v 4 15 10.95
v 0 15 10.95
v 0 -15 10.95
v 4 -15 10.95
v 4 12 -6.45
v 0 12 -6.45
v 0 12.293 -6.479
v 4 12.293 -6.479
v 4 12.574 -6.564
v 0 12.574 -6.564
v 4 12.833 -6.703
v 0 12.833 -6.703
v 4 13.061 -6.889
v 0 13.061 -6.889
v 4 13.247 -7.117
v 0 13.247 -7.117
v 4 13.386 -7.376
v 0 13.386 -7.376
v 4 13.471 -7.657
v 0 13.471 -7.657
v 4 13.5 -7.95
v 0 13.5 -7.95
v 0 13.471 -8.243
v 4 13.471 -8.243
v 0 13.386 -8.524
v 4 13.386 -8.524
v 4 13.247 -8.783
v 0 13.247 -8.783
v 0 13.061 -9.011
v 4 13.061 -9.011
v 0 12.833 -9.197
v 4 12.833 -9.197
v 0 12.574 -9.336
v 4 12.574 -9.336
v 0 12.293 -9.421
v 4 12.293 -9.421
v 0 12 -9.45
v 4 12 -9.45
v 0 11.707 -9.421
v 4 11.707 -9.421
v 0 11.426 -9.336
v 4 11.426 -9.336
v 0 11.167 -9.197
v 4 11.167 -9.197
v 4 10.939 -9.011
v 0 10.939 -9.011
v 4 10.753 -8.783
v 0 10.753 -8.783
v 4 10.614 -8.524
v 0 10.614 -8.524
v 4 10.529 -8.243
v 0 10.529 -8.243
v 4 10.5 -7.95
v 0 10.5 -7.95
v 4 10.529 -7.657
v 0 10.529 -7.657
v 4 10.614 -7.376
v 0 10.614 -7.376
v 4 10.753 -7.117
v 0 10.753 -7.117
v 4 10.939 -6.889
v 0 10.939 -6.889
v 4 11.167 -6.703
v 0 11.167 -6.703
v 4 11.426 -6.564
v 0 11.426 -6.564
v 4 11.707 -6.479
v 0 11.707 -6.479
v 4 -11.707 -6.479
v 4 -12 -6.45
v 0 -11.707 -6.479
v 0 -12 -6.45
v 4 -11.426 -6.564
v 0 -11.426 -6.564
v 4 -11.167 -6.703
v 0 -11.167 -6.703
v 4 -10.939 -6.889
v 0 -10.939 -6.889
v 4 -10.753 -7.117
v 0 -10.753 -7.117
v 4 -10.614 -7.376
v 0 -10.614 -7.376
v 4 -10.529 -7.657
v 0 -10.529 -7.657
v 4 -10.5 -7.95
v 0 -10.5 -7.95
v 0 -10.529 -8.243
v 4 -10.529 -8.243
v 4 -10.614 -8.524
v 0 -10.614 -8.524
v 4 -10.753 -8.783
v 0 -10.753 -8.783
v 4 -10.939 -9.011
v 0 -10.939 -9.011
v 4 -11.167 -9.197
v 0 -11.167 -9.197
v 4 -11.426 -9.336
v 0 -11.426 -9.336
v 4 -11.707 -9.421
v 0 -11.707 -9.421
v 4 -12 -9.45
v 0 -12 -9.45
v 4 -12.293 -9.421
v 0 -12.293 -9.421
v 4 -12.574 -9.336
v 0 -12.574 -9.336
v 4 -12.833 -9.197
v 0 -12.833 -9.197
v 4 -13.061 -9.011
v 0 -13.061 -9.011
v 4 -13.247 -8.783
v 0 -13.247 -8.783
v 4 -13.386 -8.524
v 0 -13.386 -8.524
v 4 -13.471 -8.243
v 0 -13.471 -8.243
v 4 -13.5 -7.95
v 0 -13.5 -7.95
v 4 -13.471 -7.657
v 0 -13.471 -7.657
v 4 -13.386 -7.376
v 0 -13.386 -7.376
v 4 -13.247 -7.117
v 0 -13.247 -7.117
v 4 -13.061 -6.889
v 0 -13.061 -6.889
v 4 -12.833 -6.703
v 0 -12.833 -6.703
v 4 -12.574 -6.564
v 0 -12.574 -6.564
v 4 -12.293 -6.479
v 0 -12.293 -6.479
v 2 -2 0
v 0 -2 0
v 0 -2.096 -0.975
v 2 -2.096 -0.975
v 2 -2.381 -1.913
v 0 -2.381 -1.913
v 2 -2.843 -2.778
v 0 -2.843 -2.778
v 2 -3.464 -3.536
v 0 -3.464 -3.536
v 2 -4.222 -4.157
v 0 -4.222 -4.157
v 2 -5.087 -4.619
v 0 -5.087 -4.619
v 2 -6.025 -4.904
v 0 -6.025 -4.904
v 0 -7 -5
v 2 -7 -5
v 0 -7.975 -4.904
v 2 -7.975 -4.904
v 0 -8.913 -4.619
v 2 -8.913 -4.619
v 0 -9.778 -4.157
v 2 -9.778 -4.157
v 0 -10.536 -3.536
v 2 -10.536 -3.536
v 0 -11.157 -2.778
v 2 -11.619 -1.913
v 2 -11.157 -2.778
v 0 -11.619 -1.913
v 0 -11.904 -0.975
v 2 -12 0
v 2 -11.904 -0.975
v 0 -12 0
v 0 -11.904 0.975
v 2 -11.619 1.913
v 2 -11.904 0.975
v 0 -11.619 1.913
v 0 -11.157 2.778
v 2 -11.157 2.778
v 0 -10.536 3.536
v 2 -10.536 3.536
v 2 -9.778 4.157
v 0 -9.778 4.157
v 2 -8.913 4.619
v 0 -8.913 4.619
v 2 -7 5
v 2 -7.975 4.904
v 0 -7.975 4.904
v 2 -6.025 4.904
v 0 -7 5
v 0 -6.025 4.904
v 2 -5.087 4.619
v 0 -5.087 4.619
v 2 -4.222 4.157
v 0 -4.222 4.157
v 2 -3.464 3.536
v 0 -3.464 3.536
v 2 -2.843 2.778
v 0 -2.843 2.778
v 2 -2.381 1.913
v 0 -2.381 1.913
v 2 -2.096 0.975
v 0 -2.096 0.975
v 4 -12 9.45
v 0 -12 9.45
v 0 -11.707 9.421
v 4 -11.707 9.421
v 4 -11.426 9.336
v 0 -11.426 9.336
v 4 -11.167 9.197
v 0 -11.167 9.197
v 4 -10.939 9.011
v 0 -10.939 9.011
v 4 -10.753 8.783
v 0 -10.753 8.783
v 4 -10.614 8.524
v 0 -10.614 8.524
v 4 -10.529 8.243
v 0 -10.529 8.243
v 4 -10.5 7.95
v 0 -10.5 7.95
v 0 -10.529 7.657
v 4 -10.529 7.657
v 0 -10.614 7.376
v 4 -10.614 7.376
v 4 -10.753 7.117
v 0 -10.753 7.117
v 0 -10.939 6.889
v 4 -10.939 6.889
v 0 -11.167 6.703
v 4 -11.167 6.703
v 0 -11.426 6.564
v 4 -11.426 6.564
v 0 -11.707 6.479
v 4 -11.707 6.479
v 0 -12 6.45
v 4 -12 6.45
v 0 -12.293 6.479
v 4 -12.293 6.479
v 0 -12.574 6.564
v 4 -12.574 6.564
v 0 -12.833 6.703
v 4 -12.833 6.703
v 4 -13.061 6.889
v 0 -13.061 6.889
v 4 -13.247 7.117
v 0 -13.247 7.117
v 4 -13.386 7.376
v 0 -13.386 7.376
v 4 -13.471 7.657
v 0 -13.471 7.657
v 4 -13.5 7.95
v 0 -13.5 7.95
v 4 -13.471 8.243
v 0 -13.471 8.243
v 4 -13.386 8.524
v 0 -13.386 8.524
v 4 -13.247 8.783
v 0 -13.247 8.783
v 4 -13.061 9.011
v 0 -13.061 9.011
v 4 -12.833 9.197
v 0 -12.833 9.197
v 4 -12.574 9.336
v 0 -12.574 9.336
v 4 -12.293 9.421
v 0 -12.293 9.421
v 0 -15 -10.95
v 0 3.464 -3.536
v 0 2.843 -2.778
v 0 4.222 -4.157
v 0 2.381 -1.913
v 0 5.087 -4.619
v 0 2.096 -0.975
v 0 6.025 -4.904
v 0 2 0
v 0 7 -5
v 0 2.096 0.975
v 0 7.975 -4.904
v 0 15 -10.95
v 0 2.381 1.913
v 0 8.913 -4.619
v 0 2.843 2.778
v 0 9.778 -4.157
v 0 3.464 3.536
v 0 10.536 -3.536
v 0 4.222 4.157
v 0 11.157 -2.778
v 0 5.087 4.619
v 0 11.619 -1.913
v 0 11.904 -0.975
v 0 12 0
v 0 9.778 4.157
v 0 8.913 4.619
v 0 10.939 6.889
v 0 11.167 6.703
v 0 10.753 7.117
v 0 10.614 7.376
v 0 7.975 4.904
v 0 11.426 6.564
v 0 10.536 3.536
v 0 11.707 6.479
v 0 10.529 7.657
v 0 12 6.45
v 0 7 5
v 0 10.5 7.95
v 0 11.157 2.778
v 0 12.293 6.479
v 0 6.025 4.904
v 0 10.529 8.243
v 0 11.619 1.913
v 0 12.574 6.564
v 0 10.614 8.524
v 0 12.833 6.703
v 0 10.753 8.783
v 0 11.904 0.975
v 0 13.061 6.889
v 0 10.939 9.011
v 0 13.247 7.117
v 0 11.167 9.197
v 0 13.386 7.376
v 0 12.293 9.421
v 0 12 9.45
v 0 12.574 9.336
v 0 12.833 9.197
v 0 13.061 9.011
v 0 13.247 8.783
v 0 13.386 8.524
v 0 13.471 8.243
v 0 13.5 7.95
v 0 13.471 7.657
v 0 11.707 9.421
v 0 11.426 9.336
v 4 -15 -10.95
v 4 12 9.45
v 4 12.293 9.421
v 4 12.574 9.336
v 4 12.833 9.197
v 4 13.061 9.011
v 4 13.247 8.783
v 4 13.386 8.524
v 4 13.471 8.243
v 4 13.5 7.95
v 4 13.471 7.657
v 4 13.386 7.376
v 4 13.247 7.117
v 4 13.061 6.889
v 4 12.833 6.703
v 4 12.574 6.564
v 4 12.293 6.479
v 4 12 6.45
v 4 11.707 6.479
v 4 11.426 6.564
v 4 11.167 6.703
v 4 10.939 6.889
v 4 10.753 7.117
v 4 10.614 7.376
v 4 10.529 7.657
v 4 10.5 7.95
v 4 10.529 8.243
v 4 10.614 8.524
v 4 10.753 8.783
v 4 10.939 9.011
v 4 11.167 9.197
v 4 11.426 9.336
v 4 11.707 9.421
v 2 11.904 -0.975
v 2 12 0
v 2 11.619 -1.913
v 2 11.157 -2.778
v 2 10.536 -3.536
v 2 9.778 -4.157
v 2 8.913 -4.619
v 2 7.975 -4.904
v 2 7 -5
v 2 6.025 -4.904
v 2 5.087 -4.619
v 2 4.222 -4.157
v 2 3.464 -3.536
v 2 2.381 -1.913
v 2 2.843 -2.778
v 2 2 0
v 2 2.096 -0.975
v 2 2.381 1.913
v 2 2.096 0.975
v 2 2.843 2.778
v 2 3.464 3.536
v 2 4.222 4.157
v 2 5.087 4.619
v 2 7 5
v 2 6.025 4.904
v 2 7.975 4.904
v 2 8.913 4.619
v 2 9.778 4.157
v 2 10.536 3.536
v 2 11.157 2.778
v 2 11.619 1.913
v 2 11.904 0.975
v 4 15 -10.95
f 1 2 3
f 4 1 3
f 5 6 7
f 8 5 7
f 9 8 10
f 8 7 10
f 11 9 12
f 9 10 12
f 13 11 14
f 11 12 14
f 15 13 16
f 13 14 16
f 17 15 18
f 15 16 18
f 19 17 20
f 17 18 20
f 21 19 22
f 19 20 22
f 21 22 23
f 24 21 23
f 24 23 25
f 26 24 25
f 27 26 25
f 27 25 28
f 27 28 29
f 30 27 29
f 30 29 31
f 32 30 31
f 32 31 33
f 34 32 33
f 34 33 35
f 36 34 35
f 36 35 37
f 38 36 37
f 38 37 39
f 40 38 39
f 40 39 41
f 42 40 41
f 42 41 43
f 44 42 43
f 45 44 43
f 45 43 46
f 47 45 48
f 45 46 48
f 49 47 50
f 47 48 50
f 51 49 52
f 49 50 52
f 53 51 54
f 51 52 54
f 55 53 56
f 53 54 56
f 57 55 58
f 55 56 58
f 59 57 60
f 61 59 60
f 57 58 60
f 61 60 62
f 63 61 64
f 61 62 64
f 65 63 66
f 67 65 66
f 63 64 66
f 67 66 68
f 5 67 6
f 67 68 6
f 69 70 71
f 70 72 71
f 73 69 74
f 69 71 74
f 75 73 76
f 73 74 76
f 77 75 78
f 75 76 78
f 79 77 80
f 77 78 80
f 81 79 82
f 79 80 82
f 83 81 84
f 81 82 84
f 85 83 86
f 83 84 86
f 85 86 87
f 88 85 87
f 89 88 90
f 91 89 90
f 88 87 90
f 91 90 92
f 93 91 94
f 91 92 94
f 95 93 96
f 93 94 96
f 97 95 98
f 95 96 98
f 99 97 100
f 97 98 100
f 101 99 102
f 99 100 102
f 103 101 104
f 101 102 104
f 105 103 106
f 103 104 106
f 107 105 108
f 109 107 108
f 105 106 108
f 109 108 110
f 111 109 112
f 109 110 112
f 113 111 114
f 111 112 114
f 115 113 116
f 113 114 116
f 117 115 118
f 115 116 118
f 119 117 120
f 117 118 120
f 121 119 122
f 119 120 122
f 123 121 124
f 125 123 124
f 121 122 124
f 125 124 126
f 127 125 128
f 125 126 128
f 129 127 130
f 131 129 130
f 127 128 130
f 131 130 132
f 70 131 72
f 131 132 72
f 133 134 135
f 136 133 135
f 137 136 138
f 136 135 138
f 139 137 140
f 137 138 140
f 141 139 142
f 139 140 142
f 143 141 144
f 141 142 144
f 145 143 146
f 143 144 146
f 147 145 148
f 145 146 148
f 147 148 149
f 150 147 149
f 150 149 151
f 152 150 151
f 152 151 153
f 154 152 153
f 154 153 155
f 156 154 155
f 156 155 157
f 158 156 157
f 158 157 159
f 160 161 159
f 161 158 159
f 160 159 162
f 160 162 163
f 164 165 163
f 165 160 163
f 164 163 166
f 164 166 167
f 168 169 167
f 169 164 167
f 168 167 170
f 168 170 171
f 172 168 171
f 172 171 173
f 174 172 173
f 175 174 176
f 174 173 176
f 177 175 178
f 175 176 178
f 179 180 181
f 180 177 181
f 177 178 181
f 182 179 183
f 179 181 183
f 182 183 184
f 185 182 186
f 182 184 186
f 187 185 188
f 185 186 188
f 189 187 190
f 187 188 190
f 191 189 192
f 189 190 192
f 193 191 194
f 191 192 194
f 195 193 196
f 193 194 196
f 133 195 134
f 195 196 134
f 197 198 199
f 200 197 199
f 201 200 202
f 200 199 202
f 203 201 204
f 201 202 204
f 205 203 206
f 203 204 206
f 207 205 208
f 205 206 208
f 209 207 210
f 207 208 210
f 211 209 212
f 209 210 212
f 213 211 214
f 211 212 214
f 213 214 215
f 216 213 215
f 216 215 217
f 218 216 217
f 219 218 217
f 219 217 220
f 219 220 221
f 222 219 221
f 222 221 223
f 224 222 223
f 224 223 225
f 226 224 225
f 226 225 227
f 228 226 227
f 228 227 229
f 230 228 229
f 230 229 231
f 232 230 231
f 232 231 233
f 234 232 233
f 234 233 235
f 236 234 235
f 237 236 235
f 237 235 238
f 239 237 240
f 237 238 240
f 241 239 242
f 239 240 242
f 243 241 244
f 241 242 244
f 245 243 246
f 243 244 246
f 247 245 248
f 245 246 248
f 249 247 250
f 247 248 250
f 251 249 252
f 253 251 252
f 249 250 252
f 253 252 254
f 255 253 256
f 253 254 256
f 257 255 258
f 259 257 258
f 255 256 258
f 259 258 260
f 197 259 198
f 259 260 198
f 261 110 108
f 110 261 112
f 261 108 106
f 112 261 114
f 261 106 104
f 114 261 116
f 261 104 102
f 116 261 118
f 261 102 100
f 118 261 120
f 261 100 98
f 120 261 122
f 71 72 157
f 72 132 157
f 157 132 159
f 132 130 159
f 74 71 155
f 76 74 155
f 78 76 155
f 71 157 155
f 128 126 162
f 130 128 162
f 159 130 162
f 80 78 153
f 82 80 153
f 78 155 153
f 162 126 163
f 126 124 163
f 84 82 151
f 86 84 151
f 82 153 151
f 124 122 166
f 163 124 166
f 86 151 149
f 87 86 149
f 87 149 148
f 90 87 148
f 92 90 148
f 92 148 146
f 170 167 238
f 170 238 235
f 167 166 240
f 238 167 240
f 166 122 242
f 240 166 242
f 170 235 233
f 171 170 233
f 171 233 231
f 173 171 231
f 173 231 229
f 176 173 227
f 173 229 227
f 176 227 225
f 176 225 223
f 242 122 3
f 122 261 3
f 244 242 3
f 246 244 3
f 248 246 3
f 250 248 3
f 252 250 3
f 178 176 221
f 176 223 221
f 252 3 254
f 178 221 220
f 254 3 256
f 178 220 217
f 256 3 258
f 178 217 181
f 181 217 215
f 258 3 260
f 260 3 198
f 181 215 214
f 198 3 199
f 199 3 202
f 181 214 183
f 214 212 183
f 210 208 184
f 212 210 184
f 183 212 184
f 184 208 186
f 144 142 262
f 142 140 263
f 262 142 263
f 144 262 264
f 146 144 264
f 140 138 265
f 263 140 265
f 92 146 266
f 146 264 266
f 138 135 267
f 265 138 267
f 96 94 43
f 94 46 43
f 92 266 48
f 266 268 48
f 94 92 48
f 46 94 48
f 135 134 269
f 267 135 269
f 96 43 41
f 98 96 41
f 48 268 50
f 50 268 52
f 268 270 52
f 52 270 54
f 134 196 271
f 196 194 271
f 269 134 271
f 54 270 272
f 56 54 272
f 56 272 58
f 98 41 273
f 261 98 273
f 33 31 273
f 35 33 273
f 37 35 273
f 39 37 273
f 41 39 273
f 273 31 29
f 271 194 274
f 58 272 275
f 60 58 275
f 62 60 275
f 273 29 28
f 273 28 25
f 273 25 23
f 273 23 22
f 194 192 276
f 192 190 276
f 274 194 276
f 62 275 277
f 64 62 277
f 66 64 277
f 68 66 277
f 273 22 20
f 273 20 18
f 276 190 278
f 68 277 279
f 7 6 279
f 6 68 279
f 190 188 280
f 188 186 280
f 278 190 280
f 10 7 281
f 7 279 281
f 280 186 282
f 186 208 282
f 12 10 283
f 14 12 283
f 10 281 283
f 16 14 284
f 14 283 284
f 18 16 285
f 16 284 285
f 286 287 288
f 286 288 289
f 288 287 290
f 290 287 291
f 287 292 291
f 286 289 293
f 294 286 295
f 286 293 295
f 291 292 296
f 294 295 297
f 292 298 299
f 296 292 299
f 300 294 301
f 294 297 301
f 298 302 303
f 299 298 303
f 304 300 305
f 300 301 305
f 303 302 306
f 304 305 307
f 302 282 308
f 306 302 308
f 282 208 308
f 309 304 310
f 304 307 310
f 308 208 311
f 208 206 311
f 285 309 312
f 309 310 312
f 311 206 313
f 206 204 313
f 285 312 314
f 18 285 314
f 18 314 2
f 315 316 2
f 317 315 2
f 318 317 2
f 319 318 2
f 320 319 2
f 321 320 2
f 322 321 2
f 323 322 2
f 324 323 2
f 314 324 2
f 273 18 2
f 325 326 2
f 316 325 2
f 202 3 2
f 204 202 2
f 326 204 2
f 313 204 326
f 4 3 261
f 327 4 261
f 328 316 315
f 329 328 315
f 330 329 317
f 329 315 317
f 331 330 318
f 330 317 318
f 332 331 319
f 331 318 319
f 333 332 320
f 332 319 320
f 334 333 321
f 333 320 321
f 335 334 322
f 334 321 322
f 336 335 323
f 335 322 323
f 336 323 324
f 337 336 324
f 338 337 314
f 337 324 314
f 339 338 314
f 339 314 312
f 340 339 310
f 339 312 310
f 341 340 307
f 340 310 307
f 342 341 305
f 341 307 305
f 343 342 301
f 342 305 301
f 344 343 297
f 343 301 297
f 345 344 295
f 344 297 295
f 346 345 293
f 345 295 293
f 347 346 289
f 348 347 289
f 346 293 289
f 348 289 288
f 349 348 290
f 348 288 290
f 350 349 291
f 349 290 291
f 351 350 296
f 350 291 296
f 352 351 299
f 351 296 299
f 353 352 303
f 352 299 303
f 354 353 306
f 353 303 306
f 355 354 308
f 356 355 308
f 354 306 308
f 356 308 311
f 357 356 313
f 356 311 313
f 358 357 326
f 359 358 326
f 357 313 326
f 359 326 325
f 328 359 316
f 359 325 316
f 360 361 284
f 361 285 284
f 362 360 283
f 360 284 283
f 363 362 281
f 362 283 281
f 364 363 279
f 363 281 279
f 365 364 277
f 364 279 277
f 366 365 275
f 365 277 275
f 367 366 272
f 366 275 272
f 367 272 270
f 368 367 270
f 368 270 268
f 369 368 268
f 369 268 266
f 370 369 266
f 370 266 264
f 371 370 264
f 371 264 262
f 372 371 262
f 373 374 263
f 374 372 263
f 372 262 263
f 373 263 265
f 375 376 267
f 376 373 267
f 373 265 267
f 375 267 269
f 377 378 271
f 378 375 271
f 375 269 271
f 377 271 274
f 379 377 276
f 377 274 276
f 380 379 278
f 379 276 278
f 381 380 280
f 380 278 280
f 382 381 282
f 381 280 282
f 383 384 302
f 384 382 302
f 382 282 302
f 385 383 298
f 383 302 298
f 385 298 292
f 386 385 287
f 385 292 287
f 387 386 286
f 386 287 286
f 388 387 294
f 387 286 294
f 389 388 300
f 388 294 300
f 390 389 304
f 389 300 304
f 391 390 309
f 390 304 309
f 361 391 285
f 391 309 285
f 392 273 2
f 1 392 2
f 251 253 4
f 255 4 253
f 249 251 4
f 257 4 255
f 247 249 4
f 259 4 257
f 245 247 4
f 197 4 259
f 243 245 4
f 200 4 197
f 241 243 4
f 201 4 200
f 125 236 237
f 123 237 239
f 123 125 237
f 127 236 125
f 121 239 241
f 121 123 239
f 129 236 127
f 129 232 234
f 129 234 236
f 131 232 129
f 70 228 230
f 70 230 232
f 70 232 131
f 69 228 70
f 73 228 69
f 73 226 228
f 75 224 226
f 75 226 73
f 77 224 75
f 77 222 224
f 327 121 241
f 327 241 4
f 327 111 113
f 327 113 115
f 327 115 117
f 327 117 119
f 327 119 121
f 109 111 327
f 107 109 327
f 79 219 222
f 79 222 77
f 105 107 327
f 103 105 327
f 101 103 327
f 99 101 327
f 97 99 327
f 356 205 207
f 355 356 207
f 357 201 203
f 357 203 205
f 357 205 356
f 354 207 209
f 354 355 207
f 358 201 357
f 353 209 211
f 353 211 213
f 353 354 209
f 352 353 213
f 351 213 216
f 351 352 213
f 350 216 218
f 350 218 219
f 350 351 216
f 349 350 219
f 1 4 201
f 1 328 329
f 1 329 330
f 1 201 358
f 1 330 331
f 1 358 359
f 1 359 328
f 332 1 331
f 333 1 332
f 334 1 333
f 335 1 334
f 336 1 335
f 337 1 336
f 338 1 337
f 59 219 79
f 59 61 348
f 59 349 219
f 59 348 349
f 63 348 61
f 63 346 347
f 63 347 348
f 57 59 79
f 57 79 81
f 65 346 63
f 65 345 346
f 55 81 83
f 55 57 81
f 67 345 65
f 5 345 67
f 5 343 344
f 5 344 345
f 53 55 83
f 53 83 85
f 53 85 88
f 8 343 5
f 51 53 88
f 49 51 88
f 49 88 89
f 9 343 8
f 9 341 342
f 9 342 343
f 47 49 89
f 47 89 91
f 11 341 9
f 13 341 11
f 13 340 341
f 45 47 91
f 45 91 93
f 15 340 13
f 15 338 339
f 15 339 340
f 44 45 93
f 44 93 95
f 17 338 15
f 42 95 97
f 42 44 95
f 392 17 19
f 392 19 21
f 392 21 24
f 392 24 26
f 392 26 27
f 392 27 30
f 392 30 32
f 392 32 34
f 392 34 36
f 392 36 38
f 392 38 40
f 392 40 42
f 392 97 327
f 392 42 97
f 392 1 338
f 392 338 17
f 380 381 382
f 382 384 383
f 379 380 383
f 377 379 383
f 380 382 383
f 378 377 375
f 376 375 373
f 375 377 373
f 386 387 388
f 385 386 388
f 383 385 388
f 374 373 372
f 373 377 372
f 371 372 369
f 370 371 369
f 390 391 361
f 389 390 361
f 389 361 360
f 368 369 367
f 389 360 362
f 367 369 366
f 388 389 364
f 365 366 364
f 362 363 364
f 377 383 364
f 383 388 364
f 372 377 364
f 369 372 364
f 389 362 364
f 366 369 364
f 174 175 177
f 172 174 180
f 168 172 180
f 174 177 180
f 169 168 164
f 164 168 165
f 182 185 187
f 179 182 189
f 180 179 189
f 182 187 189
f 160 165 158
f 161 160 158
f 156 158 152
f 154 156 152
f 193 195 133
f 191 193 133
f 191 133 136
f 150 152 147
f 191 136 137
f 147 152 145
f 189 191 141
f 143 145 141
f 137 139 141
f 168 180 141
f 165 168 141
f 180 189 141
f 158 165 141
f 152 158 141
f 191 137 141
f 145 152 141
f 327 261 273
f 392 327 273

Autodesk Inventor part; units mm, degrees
ref_plane "YZ Plane" through (0, 0, 0) normal (1, 0, 0) x (0, 1, 0)
ref_plane "XZ Plane" through (0, 0, 0) normal (0, 1, 0) x (-1, 0, 0)
sketch "Эскиз1" plane through (0, 0, 0) normal (1, 0, 0) x (0, 1, 0)
  line L0 (-15, -10.95) -> (15, -10.95)
  line L1 (15, -10.95) -> (15, 10.95)
  line L2 (15, 10.95) -> (-15, 10.95)
  line L3 (-15, 10.95) -> (-15, -10.95)
  line L4 (-15, -10.95) -> (15, 10.95) construction
  line L5 (15, -10.95) -> (-15, 10.95) construction
  circle A0 centre (7, 0) radius 5
  circle A1 centre (-7, 0) radius 5
  point P0 (0, 0)
  dimension "d0" = 30
  dimension "d1" = 21.9
  dimension "d2" = 10
  dimension "d3" = 10
  dimension "d4" = 8
  dimension "d5" = 14
  dimension "d6" = 8
  dimension "d7" = 0
extrude "Выдавливание1" add sketch "Эскиз1" along normal blind 2
sketch "Эскиз2" plane through (2, 0, 0) normal (1, 0, 0) x (0, 0, -1)
  line L0 (10.95, 15) -> (-10.95, 15) projected
  line L1 (10.95, -15) -> (-10.95, -15)
  line L2 (-10.95, -15) -> (-10.95, 15)
  line L3 (-10.95, 15) -> (10.95, 15)
  line L4 (10.95, 15) -> (10.95, -15)
  line L5 (10.95, -15) -> (-10.95, 15) construction
  line L6 (-10.95, -15) -> (10.95, 15) construction
  point P0 (0, 0)
extrude "Выдавливание2" add sketch "Эскиз2" along normal blind 2
sketch "Эскиз3" plane through (0, 0, 0) normal (-1, 0, 0) x (0, 0, 1)
  circle A0 centre (-7.95, 12) radius 1.5
  line L0 (-10.95, 15) -> (10.95, 15) projected
  line L1 (-10.95, -15) -> (-10.95, 15) projected
  circle A1 centre (-7.95, -12) radius 1.5
  line L2 (10.95, -15) -> (-10.95, -15) projected
  circle A2 centre (7.95, 12) radius 1.5
  line L3 (10.95, 15) -> (10.95, -15) projected
  circle A3 centre (7.95, -12) radius 1.5
  point P0 (0, 0)
  dimension "d12" = 3
  dimension "d13" = 3
  dimension "d14" = 3
  dimension "d15" = 3
  dimension "d16" = 3
  dimension "d17" = 3
  dimension "d18" = 3
  dimension "d19" = 3
  dimension "d20" = 3
extrude "Выдавливание3" cut sketch "Эскиз3" against normal up to surface (4 mm away) contours A0 | A1 | A2 | A3
properties part number "держатель магнитов на основе"
